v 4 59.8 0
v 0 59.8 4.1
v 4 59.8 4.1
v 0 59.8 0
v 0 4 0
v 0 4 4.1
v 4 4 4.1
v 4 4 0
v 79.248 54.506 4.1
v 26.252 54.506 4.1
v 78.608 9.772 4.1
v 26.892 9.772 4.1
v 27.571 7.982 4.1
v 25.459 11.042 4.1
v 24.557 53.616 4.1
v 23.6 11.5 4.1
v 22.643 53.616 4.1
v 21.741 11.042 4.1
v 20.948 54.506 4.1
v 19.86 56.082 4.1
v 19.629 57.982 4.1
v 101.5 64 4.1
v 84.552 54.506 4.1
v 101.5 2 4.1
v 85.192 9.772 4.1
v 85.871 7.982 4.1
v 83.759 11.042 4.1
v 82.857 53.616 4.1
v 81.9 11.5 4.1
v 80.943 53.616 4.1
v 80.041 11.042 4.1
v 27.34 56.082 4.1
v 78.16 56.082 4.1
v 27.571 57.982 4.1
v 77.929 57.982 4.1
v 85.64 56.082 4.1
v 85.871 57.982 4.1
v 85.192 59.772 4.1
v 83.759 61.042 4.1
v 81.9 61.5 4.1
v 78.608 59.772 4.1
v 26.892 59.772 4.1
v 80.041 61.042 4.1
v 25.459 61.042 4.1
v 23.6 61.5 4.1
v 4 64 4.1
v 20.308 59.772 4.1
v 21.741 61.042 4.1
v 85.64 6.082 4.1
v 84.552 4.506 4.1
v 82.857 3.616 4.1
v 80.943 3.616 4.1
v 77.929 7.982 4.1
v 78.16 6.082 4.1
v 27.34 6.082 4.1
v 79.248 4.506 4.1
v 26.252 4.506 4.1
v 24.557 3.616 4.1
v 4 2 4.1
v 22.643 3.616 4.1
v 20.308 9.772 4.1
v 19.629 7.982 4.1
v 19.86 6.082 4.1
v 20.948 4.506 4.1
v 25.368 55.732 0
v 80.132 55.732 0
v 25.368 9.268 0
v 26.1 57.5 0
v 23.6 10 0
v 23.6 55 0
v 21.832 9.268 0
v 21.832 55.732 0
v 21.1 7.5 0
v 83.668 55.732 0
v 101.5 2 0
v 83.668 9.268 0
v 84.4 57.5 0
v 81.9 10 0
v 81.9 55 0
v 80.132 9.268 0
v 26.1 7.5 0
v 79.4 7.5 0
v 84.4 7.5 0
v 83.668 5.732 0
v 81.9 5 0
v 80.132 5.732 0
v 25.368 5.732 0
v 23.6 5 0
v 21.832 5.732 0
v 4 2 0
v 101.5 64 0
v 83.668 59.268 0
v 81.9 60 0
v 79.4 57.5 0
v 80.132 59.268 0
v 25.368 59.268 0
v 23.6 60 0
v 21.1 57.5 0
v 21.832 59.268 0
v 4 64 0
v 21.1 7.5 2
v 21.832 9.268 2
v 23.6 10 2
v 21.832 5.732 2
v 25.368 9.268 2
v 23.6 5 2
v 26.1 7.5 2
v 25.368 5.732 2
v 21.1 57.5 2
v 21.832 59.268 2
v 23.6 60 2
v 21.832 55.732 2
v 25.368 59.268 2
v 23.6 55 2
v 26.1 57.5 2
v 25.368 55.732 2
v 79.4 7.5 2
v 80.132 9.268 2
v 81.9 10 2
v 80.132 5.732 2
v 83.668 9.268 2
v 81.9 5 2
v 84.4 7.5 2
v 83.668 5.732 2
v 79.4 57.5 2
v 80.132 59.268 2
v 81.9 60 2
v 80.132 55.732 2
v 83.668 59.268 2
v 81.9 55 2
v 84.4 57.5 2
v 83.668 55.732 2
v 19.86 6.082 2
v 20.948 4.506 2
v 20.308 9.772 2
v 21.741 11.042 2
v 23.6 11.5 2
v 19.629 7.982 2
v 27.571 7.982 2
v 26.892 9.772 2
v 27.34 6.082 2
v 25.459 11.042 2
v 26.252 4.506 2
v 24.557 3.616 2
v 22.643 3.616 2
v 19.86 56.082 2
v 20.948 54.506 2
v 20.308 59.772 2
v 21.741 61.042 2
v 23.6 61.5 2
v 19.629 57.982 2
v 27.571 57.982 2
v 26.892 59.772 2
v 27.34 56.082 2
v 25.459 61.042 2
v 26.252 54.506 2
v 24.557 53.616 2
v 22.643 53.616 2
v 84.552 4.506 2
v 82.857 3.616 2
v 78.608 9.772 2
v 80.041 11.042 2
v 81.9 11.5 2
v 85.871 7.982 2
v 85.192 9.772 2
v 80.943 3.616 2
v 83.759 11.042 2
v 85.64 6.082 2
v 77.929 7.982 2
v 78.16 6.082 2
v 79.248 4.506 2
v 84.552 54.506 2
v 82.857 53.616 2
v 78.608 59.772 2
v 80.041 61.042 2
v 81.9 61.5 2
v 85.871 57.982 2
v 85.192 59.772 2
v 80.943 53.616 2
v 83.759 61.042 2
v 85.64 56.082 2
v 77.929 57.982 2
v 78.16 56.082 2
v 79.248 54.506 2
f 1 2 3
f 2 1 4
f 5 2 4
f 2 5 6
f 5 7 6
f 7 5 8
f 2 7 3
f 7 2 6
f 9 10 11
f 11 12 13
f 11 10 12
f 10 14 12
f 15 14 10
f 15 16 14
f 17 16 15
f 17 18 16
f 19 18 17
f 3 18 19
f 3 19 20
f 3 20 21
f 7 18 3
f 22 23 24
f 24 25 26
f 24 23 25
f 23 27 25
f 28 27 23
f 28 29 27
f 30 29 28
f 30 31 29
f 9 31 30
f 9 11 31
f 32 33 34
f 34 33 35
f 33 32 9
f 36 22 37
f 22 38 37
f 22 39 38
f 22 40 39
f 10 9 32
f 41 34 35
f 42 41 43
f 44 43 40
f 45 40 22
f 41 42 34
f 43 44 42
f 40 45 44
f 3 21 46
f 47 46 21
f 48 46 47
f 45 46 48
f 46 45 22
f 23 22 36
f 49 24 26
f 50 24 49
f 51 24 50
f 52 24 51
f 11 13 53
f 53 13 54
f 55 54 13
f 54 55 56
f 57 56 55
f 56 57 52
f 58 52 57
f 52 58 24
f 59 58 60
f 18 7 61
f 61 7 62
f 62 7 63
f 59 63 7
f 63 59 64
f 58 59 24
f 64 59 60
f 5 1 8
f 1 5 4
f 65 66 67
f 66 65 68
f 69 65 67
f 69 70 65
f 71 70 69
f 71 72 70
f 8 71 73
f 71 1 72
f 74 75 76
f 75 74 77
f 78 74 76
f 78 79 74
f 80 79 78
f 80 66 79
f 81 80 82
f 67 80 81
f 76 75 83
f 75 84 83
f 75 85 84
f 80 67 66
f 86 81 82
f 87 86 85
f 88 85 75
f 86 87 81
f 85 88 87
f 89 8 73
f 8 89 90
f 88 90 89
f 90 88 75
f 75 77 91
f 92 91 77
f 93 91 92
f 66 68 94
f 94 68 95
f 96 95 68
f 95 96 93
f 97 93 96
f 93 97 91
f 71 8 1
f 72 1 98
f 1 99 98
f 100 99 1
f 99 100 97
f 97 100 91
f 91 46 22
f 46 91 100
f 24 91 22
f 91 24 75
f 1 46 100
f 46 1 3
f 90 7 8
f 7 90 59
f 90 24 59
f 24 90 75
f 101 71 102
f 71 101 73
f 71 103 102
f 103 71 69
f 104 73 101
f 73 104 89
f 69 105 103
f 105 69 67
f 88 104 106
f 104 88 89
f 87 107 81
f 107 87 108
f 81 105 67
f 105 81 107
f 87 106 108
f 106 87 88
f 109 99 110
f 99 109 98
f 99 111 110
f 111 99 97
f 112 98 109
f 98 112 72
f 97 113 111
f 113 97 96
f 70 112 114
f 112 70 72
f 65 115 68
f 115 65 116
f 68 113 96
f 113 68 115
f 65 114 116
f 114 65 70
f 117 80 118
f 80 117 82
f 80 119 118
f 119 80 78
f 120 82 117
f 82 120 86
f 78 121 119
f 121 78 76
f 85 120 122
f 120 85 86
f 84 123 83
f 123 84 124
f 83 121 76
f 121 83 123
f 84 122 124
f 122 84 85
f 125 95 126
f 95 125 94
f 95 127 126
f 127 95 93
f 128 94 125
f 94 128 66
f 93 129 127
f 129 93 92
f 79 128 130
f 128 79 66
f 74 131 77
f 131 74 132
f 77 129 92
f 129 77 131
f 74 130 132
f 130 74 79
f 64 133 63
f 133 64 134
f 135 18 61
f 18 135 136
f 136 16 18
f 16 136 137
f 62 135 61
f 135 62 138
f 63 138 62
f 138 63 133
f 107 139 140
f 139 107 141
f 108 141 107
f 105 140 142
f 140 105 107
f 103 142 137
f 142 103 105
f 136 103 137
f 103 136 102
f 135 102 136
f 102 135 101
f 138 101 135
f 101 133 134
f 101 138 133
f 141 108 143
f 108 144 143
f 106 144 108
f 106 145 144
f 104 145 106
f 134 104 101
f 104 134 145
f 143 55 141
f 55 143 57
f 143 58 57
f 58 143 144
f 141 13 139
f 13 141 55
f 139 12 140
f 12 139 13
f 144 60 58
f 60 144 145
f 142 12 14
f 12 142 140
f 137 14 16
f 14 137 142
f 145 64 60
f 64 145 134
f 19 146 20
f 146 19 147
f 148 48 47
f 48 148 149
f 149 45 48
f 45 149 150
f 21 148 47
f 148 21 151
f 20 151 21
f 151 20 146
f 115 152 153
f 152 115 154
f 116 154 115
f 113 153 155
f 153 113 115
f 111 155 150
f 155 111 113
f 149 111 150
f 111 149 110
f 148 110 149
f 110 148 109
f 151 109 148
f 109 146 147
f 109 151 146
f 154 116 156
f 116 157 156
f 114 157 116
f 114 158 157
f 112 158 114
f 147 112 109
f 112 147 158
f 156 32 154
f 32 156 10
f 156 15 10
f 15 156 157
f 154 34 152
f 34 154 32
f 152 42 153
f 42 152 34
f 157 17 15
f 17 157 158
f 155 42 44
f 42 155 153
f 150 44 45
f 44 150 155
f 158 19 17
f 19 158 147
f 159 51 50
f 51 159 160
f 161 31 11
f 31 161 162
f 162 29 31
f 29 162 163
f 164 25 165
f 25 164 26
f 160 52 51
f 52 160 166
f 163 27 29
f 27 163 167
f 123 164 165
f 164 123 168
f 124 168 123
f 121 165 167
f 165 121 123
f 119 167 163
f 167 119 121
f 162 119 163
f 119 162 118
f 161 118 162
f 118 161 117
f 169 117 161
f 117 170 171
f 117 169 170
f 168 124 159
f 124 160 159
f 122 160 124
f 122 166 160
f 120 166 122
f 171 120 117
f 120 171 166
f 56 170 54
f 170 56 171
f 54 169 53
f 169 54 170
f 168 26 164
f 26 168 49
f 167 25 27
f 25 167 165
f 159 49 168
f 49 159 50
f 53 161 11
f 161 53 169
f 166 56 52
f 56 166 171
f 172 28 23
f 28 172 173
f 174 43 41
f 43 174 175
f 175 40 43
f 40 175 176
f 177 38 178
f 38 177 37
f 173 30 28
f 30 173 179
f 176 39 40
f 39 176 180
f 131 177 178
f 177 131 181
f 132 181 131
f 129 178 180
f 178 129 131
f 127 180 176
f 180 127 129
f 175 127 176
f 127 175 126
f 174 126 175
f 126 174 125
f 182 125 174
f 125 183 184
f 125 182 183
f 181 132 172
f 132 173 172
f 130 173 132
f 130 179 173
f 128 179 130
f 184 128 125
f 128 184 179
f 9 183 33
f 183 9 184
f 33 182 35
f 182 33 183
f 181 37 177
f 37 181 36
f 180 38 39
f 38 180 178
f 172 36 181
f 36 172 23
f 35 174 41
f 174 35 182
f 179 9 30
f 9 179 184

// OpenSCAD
// file: ../../library.scad
module tubo(
	h/*Altura*/,
	w/*Pared*/,
	d/*Diametro*/
){
  difference()
  {
    cylinder(r=(d/2), h);
    translate([0,0,-0.1])
    cylinder(r=(d/2)-(2*w), h+0.2);
  }
}

module huyoMasPared(
	d/*Diametro del hoyo*/,
	w/*Pared*/,
	h/*Altura*/,
){
  difference()
  {
    cylinder(r=((d+(2*w))/2), h);
    translate([0,0,-0.1])
    cylinder(r=(d/2), h+0.2);
  }
}

module cuboMasPared(
    w1, //Largo
    w2, //Ancho
    p1, //Pared
    p2, //Pared
    h   //Alto
)
{    
    difference()
    {
        translate([-(w1+(p1*2))/2,-(w2+(p2*2))/2,0])
        cube([(w1+(p1*2)),(w2+(p2*2)),h]);
        
        translate([-w1/2,-w2/2,-0.2])
        cube([w1,w2,h*2]);
        
    }
    
    
}

soporteW = 0.7;

module soporteCylinder()
{
  difference()
  {
	cylinder(r=radio,altura);

	translate([0,0,-0.1])
	cylinder(r=radio-soporteW,altura+0.2);
  }

  if(true){
  difference()
  {
	cylinder(r=radio+0.75,1);

	translate([0,0,-0.1])
	cylinder(r=radio-0.75,1.25);
  }}

}

module soporteOval()
{
  difference()
  {
	oval(w=ancho, h=largo, height=alto, center = false);

	translate([0,0,-0.1])
	oval(ancho-soporteW, largo, alto+0.2);
  }

  difference()
  {
	oval(w=ancho+1, h=largo+1, height=1, center = false);

	translate([0,0,-0.1])
	oval(w=ancho-1, h=largo-1, height=1.25, center = false);
  }

}


module oval(w,h, height, center = false)
{
  scale([1, h/w, 1]) cylinder(h=height, r=w, center=center);
}
// file: Tapa.scad
batX = 0;//22.4Ancho frente
batY = 21.4;//Alto frente
batZ = 90.5;//Profundo


pared = 4;
pared2 = 2*pared;
medPared = pared/2;

raspX = 58;
raspY = 18;
raspZ = 84.5;

h = batY+pared2;

mainAreaX = raspX+batX+pared2; 
mainAreaY = batY+pared2;
mainAreaZ = batZ+pared+5+4;

mainAreaIntX = mainAreaX-pared2;
mainAreaIntY = mainAreaY-pared;
mainAreaIntZ = mainAreaZ-pared;

x1 = pared+3.5;
z1 = 23.6;
x2 = x1+50;
x3 = pared+3.5;
z3 = 81.9;

cejaHorPosX = mainAreaX-batX-pared;
cejaVertPosX = mainAreaX-pared-2;
torH = batY+pared;


rotate([90,0,90])
doALl();



module doALl(){
difference()
{
	translate([medPared,0,pared])
	doTop();	

	translate([0,-1,0])
	baseBatTorn(2.5);

	translate([0,2,0])
	baseBatTorn(4);

}
}

module doTop()
{
	translate([2,0,-4])
	cube([
			mainAreaX-pared-6.2,
			pared+0.1,
			mainAreaZ-pared2+medPared
	  	]);
	cube([
			mainAreaX-pared,
			pared+0.1,
			mainAreaZ-pared2+medPared
	  	]);
}



module baseBatTorn(r)
{
//Tornillos
translate([x1,0,z1])
tornCyl(r);
translate([x2,0,z1])
tornCyl(r);
translate([x1,0,z3])
tornCyl(r);
translate([x2,0,z3])
tornCyl(r);
}











module tornCyl(rad)
{
	rotate([-90,0,0])
	{
		cylinder(r=rad,torH);
	}
}
// file: Diffracter.scad
include <Tapa.scad>
include <../../library.scad>


bigW = 70;
ori = bigW/2;
raspSellR = 59;
tuboH = 140;
H = 18.5;
selloH = 7;
tornR = 2;

huecoPared = 12;
huecoH = 22;


if(false)
{
translate([0,0,H])
rotate([0,180,0])
diffracter();


//soporteCylinder(radio=25.2,altura=3.8);

}


module diffracter(){	

difference(){

//Bloque
translate([-bigW/2,-bigW/2,0])
cube([bigW,bigW,H]);


translate([
						-(bigW-huecoPared)/2,
						-(bigW-huecoPared)/2,
						(huecoH/2)
					])
		cube([
					bigW-huecoPared,
					bigW-huecoPared,
					H-huecoH]
				);


//Diffractador
translate([-27.25,-32.5,-0.1])
cube([54.5,65,5.6]);

//Macro
translate([0,0,5.4])
cylinder(r=(54.5/2),8.2);

//Sello de raspberry
//translate([0,0,-0.1])
//cylinder(r=(raspSellR/2)+1,2);

//Tubo
//translate([0,0,-0.1])
//cylinder(r=(52/2),200);

//Tornillos abajo
translate([-ori+4,-ori+4,-0.1])
cylinder(r=tornR,20);
translate([ori-4,-ori+4,-0.1])
cylinder(r=tornR,20);
translate([-ori+4,ori-4,-0.1])
cylinder(r=tornR,20);
translate([ori-4,ori-4,-0.1])
cylinder(r=tornR,20);

//Hueco
cylinder(r=25.5,H+1);

//Tornillos caja
translate([0,0,(tuboH/2)-7])
rotate([0,90,0])
tornillosArriba();

//Tornillo tripie
translate([-ori-0.1,0,(tuboH/2)+7])
rotate([0,90,0])
cylinder(r=5/2,5.31);

//Sello hembra
translate([0,0,H-3])
cylinder(r=30,4);

}

//Sello cobertura
//translate([0,0,H-1])
//huyoMasPared(58,3,3);


}
// main file
include <Diffracter.scad>

frameW = 64;
frameH = 53.5;
frameD = 2.5;

slideW = frameW - 9;
slideH = frameH - 10;
slideD = 0.8;

winW = slideW;
winH = slideH - 10;

diffW = winW+5;
diffH = winH+13;

//Frame();

module Frame()
{
difference()
{

  //translate([-frameW/2,-frameH/2,0])
  //cube([frameW,frameH,frameD]);

  areaSello();

  translate([-winW/2,-winH/2,-0.5])
  cube([winW,winH,frameD*2]);

  translate([-diffW/2,-diffH/2,frameD-0.8])
  cube([diffW,diffH,2]);

}
}


module areaSello()
{
  //cylinder(r=(raspSellR/2)-1,frameD);

  translate([-(frameW)/2,-(frameH)/2,0])
  cube([frameW,frameH,frameD]);
}
